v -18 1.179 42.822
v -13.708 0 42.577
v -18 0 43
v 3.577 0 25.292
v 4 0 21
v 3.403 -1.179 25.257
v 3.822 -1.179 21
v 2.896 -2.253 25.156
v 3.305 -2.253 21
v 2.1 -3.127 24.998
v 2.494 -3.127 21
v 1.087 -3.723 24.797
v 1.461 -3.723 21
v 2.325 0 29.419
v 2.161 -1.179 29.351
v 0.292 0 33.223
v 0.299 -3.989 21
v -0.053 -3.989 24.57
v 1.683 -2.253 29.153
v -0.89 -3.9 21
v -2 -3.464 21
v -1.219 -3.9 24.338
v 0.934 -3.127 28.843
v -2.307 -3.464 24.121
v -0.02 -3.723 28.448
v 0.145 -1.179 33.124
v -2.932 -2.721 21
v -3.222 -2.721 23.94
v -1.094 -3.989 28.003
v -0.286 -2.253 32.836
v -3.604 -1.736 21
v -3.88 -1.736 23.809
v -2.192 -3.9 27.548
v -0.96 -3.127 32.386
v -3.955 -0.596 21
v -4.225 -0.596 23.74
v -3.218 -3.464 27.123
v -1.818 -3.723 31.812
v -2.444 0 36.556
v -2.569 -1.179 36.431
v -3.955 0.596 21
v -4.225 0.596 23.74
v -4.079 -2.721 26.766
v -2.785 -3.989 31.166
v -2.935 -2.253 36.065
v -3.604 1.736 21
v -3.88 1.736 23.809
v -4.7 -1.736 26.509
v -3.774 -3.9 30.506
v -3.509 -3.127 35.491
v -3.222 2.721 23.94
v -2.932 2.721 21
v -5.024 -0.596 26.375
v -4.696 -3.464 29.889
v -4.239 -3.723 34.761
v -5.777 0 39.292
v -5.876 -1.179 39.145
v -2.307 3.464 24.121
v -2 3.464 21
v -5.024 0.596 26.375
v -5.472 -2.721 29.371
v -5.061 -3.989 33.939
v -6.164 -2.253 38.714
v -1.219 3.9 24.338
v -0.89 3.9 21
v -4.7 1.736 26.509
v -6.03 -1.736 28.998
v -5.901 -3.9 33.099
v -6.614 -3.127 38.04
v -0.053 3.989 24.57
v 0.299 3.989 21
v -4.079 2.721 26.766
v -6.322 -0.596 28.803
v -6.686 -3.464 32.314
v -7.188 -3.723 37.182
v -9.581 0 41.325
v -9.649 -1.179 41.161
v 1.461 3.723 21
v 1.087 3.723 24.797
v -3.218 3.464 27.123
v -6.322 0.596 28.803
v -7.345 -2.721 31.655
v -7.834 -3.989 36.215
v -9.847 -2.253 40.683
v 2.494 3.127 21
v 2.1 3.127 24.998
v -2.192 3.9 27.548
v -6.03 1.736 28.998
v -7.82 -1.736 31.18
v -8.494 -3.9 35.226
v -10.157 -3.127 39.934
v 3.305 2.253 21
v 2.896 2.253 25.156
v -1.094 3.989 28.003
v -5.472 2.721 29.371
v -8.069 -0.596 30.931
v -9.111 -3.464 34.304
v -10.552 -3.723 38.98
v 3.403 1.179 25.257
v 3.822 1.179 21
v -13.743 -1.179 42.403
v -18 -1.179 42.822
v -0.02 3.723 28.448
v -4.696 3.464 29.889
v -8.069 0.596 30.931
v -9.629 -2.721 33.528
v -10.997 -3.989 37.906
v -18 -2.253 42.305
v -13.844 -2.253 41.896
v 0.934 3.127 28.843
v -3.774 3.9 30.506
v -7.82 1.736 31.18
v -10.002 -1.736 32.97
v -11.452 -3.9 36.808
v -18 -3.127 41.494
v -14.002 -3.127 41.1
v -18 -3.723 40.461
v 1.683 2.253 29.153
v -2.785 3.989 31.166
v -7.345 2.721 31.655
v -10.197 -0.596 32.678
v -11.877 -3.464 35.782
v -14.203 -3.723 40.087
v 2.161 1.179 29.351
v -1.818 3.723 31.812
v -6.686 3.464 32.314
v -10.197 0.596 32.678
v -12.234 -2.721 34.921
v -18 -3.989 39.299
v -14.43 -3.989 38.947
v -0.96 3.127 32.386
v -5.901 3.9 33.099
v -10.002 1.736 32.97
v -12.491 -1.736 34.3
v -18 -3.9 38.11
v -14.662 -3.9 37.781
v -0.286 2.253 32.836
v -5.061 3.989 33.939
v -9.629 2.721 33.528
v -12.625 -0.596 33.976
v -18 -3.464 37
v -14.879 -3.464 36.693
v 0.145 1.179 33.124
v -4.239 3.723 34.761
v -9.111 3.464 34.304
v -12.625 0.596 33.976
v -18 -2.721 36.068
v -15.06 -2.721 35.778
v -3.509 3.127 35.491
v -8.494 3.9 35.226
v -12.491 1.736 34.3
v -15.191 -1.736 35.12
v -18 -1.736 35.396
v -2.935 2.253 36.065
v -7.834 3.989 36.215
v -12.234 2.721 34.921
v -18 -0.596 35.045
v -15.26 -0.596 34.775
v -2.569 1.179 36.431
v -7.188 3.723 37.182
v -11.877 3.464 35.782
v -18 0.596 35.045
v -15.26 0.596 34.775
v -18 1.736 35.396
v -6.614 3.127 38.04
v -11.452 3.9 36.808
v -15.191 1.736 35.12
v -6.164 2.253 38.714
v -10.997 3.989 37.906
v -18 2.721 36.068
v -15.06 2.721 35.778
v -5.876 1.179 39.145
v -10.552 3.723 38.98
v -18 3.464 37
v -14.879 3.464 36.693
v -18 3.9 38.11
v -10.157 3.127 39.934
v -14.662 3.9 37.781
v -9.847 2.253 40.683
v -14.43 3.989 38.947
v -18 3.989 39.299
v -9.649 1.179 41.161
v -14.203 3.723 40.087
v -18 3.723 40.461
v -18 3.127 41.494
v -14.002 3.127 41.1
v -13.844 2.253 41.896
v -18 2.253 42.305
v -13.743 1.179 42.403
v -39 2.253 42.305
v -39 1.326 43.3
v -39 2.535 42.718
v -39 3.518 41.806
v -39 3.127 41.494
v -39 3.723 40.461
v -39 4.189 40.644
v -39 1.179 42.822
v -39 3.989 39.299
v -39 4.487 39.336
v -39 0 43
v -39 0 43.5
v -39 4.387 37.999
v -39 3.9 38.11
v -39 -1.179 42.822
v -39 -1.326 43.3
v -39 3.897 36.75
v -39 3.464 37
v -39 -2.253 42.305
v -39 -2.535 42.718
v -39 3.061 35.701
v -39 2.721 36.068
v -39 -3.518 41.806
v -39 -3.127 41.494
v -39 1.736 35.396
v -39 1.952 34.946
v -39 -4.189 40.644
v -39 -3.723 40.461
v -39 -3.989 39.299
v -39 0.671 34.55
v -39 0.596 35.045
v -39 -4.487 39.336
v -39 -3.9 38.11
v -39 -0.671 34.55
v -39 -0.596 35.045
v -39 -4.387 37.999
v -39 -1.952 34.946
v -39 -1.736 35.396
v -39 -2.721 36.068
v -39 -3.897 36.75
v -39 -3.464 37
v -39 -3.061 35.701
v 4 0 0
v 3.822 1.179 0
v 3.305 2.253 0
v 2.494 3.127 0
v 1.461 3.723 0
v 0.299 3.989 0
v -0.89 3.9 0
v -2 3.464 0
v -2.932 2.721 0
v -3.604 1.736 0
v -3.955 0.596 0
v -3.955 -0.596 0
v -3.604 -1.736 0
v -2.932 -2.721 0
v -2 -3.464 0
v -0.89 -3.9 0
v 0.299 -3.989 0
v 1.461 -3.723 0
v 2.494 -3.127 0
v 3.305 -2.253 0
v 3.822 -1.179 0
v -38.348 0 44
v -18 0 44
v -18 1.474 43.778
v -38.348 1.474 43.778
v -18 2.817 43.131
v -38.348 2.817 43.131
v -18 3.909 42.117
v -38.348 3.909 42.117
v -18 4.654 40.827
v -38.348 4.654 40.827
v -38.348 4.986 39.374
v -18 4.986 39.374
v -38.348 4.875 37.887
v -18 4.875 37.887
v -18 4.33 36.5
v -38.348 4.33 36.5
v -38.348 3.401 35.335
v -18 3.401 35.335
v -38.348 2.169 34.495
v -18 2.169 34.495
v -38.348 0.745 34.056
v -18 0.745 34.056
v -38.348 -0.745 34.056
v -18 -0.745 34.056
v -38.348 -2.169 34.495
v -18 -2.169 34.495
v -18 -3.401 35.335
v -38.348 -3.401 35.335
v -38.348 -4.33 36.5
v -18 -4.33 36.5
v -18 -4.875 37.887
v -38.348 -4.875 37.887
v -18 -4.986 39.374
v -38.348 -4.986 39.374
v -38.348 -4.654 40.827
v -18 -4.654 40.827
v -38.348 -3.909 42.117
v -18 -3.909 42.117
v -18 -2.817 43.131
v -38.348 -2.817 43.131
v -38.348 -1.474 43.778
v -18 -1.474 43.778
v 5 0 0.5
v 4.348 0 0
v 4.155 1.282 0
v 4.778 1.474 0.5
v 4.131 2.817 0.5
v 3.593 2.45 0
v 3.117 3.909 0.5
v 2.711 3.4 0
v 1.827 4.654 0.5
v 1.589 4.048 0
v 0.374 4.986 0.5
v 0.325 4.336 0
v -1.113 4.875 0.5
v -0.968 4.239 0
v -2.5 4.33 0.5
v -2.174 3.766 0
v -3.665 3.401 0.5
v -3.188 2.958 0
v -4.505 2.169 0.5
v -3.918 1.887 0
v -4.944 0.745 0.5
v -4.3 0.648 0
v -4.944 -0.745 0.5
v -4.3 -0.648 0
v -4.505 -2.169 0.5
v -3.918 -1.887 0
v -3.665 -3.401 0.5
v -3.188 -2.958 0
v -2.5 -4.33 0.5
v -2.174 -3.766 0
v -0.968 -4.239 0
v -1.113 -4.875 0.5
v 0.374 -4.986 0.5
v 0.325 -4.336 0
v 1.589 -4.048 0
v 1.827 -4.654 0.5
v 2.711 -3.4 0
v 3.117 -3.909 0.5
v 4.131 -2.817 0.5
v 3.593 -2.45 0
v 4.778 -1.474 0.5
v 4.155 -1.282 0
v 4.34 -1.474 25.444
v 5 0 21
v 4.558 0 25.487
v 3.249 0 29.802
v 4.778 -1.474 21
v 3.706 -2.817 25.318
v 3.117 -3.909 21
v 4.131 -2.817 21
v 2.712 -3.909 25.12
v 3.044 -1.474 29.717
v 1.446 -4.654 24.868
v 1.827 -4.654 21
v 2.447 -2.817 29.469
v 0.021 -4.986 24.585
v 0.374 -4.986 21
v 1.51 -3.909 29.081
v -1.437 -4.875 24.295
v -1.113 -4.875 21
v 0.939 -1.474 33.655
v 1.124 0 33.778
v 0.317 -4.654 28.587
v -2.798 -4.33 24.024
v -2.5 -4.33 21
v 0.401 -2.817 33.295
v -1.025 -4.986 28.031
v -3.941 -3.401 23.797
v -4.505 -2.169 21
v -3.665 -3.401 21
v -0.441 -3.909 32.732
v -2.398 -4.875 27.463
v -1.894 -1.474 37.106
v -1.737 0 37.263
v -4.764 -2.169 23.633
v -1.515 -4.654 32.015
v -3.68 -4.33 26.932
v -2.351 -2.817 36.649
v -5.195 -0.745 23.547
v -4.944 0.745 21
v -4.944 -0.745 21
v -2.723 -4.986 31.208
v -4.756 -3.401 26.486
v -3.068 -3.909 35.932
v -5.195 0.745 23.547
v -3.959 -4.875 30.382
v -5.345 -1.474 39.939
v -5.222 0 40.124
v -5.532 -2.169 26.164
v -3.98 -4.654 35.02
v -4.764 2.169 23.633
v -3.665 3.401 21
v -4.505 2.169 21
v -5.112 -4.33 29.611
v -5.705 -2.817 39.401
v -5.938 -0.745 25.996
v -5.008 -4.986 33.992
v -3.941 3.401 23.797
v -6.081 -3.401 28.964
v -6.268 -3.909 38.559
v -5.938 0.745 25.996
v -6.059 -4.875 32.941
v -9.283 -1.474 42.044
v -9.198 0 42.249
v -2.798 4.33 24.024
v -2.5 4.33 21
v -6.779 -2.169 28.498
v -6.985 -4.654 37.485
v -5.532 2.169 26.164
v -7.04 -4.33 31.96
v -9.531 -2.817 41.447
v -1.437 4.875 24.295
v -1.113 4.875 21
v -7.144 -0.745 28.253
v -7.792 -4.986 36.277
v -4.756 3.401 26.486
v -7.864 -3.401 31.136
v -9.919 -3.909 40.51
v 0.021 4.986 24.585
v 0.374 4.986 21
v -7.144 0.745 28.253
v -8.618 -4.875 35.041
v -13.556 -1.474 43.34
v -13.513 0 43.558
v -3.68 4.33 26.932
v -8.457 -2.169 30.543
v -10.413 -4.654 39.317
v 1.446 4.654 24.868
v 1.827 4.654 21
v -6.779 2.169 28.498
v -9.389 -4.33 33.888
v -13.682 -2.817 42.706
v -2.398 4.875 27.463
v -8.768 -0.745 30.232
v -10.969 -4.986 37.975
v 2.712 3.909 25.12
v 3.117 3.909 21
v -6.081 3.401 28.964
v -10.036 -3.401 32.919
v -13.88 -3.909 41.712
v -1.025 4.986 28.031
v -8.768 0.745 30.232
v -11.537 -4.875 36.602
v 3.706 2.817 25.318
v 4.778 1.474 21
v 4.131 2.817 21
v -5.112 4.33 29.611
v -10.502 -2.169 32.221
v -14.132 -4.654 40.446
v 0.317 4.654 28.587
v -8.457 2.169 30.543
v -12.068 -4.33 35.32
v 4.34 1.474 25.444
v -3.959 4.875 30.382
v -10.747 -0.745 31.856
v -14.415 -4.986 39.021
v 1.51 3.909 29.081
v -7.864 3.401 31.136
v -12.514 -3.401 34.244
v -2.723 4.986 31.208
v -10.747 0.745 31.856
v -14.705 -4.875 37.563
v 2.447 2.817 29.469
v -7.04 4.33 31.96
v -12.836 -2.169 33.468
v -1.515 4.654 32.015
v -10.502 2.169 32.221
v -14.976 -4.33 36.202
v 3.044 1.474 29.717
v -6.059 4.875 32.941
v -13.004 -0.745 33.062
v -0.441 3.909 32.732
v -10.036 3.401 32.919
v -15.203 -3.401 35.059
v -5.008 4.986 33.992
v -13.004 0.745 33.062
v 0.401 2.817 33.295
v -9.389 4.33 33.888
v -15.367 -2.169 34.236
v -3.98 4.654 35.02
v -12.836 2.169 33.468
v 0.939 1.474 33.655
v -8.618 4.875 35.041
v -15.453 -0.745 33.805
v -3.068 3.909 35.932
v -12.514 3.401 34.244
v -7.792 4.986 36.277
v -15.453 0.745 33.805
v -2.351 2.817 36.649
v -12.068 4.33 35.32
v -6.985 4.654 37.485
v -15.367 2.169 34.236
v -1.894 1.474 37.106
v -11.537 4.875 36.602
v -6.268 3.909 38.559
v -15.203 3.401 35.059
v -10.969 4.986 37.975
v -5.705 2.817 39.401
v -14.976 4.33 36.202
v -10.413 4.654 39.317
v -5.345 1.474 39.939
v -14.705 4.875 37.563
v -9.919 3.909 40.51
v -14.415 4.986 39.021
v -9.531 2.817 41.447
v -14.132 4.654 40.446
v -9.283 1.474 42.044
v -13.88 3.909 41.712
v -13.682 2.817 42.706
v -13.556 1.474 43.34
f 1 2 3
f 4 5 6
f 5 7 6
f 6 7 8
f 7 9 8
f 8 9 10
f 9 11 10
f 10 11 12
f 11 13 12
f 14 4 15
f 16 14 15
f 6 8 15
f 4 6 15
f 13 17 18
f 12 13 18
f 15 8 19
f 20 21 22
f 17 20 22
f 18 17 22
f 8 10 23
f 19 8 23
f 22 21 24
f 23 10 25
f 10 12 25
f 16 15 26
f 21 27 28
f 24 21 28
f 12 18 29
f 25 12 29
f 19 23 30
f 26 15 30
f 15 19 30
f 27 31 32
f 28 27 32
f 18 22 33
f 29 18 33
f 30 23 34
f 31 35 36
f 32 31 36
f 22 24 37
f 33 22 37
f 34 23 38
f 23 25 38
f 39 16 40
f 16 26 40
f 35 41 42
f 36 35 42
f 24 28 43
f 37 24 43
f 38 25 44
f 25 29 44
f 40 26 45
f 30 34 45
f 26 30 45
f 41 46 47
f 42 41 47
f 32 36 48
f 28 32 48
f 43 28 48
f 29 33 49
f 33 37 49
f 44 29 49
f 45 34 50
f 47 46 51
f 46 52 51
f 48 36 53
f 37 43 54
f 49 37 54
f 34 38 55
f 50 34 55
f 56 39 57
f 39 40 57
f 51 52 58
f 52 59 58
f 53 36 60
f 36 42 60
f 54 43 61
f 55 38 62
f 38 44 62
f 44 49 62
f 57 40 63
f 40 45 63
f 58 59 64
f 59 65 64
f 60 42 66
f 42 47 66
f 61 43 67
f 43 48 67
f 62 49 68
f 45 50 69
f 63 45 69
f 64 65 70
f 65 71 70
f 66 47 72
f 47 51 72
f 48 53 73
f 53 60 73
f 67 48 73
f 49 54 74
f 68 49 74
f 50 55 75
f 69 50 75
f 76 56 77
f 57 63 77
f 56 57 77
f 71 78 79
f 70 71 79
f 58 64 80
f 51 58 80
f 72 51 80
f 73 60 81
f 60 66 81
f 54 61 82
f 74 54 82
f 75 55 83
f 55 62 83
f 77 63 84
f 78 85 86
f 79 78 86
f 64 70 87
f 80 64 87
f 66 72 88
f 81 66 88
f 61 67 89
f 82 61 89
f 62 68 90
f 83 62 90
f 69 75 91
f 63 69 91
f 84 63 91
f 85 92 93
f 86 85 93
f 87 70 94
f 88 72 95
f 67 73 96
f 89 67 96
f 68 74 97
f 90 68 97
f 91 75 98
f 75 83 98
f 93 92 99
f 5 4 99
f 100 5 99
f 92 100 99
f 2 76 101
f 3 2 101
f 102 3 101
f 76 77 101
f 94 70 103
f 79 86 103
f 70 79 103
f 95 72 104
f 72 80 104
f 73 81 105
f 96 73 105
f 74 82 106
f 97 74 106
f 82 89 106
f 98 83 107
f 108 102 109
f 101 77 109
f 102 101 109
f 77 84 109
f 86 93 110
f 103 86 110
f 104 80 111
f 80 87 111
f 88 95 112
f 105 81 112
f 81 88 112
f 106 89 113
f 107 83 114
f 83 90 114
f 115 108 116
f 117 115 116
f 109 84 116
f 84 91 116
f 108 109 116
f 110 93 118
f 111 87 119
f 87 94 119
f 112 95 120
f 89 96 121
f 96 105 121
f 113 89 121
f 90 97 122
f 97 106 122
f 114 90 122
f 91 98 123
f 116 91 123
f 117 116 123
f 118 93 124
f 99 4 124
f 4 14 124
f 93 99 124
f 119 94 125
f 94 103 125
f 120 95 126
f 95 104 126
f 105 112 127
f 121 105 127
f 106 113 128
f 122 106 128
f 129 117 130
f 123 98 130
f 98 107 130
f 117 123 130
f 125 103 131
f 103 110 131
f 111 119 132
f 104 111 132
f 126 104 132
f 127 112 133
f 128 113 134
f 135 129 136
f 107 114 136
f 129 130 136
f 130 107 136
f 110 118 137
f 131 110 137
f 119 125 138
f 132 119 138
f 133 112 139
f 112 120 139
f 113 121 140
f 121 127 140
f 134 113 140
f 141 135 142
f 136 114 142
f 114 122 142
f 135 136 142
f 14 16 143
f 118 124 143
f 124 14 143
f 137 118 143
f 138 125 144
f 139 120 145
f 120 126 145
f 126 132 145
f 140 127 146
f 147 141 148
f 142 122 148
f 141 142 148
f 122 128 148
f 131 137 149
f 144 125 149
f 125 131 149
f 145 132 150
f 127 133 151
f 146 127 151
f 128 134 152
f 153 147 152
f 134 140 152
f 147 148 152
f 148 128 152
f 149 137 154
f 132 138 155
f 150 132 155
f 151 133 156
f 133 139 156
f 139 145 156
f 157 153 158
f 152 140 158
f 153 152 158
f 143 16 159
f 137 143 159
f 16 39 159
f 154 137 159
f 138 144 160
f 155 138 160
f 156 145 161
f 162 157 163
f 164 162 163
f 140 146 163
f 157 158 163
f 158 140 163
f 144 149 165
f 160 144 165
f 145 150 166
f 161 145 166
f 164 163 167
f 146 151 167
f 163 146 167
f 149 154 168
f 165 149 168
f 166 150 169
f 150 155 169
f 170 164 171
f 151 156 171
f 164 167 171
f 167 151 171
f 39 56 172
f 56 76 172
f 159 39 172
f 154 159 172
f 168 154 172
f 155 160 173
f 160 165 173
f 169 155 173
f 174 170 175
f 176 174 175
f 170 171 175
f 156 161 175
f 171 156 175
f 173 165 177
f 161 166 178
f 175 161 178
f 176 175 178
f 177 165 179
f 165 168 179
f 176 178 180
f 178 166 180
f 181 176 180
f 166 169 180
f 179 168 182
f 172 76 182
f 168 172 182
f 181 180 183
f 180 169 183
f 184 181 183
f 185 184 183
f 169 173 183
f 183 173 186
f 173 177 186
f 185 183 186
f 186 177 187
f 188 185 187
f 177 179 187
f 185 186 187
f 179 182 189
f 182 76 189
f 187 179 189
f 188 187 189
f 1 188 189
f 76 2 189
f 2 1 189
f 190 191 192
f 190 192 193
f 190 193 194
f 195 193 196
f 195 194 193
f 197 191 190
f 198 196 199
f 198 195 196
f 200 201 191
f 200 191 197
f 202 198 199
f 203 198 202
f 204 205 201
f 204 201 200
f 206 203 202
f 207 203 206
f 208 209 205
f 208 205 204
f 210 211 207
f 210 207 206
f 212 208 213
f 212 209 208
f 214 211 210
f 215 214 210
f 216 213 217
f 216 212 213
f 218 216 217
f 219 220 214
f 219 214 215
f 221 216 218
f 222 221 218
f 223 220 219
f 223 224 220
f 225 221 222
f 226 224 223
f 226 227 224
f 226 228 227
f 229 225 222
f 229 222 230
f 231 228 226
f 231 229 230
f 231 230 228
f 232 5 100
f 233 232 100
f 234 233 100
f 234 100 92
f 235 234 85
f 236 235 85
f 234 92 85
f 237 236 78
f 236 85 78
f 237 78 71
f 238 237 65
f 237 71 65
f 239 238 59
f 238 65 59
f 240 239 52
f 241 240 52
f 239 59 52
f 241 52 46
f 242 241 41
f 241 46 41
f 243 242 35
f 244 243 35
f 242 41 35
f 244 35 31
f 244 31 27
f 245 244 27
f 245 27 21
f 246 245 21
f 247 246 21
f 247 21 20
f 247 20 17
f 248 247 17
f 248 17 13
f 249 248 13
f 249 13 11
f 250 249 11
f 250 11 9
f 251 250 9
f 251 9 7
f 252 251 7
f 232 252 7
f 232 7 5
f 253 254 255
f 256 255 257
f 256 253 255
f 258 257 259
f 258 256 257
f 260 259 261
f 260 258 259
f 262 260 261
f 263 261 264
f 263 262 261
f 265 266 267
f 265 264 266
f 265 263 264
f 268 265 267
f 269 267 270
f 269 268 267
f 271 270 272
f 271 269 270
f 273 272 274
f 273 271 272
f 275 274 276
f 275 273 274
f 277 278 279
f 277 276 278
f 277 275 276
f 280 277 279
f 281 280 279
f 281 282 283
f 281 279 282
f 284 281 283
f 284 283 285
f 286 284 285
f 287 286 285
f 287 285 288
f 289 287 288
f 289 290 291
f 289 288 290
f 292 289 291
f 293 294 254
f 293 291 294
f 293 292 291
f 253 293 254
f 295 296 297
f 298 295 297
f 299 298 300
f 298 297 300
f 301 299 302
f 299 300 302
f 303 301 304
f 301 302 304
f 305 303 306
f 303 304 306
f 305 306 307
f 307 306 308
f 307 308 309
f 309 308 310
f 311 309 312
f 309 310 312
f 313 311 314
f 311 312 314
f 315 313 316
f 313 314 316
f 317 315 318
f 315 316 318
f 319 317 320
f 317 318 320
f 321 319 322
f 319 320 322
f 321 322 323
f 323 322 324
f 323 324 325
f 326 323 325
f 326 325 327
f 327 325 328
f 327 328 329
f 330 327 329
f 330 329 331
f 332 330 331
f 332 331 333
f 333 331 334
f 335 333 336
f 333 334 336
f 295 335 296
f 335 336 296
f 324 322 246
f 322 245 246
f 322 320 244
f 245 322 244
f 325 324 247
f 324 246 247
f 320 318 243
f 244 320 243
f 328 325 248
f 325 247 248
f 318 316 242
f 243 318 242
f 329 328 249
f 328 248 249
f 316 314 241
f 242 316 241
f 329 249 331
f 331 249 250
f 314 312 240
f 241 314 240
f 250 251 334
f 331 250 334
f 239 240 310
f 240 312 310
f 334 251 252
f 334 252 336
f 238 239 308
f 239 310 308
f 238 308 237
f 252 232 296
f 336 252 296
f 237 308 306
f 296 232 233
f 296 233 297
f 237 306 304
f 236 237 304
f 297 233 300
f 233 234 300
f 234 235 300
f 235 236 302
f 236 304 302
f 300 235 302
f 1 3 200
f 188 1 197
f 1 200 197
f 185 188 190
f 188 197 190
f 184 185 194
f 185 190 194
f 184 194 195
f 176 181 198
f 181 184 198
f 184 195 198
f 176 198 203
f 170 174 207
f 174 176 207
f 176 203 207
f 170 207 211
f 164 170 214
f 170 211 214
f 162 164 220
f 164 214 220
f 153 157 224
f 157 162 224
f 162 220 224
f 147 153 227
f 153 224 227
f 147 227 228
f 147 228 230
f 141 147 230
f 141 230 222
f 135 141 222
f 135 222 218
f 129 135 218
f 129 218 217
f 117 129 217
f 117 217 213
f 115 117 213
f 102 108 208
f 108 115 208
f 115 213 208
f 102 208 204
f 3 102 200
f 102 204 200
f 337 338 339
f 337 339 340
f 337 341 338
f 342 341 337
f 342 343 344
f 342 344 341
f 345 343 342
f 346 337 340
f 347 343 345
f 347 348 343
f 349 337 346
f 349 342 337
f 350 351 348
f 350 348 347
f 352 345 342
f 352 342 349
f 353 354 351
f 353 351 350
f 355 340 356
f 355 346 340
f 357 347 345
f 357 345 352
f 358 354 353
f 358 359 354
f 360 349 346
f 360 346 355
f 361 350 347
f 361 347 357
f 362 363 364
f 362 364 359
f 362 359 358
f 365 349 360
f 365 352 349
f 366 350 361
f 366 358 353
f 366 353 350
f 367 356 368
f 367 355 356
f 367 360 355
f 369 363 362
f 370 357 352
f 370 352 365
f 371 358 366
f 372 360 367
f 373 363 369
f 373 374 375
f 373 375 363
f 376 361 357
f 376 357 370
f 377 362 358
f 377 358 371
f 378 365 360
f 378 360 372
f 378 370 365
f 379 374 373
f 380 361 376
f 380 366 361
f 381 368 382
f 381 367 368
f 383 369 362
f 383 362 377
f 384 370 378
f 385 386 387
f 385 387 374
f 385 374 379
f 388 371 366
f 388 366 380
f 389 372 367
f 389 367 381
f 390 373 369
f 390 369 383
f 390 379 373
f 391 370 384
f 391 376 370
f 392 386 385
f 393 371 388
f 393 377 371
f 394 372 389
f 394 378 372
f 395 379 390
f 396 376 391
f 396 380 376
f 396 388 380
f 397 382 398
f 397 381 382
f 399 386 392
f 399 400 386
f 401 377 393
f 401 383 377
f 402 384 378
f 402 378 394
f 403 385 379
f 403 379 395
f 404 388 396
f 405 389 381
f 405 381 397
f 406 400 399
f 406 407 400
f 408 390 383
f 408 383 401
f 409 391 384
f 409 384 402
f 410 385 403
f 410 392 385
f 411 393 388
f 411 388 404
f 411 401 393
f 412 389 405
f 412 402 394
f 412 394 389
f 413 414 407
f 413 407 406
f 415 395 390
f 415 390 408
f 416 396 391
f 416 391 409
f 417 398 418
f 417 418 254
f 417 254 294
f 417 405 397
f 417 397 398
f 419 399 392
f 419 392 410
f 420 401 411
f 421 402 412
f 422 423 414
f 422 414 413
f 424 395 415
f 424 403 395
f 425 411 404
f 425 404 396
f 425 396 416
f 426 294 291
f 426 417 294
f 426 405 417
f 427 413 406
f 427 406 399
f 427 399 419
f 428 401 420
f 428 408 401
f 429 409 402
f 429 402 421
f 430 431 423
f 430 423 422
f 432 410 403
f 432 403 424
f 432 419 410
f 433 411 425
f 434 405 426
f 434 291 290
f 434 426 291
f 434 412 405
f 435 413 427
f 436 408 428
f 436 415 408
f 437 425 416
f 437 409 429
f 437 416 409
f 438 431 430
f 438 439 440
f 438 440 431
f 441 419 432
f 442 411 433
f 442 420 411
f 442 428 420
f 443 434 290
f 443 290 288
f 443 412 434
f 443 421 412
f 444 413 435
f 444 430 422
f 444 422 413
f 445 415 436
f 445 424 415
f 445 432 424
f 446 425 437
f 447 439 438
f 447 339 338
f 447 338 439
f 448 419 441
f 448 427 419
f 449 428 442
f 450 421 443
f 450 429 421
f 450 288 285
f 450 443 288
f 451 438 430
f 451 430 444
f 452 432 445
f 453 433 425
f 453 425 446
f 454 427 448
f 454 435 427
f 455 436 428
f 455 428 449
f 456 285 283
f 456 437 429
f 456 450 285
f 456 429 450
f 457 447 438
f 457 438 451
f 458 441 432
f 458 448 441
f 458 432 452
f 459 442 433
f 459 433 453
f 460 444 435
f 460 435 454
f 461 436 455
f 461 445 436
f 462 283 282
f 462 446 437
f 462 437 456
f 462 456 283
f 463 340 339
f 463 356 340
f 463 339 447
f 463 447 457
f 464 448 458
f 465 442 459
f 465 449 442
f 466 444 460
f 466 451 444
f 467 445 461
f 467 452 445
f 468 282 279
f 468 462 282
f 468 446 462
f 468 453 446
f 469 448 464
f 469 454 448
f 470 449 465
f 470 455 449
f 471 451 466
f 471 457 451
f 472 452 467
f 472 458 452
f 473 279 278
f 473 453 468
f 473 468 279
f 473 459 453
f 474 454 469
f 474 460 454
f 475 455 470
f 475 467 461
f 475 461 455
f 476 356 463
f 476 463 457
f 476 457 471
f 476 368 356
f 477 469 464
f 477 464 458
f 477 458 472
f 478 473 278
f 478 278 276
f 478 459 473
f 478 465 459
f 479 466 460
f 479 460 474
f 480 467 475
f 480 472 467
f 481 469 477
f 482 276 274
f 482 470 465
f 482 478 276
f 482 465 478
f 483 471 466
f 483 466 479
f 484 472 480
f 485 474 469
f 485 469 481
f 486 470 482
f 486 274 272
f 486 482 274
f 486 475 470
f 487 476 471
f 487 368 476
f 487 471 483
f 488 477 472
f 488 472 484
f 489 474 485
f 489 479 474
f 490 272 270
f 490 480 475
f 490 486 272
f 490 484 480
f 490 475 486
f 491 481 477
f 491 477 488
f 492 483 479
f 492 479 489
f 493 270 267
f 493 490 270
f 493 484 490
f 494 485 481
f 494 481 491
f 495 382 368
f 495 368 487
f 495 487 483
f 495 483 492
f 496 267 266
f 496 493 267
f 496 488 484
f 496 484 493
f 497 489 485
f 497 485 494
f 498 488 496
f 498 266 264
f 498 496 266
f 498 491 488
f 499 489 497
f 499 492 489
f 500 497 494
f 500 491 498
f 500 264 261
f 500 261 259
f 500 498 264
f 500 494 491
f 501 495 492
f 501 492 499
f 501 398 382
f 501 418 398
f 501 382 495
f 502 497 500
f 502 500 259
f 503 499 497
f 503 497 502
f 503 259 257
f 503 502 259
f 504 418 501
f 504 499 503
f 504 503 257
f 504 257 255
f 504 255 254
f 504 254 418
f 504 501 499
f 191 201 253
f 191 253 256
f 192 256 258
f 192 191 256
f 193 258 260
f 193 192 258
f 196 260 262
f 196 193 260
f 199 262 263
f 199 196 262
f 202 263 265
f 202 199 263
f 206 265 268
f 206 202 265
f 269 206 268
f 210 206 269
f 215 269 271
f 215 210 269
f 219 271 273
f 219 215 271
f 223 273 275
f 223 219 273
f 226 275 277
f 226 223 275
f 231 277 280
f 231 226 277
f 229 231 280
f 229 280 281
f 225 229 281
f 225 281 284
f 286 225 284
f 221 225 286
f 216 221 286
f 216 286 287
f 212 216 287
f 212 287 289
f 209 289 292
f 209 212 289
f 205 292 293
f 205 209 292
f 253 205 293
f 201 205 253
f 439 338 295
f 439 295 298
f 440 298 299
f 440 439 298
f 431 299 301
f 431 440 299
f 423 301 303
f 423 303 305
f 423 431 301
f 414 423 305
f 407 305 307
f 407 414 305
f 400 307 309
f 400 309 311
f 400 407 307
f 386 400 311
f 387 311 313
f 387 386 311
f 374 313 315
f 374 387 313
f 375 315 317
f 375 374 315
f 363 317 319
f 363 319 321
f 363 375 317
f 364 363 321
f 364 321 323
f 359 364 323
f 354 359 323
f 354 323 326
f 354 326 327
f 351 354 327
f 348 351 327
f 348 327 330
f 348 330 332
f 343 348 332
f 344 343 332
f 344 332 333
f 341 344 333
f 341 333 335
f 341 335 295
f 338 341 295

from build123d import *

# Parameters (mm, degrees)
F0_R        = 5
F0_R_2      = 4
F3_C1_SIZE2 = 0.6516126864
F3_C1_SIZE  = 0.5
F3_C2_SIZE2 = 0.5
F3_C2_SIZE  = 0.6516126864


with BuildPart() as f2:
    # F2: sweep along a path in F1
    with BuildLine(Plane.XZ) as f2_path:
        Line((0, 0), (0, 21))
        ThreePointArc((0, 21), (-5.2720779386, 33.7279220614), (-18, 39))
        Line((-18, 39), (-39, 39))
    # F0 (on Top) → F2 (sweep)
    with BuildSketch(Plane.XY):
        Circle(F0_R)
        Circle(F0_R_2, mode=Mode.SUBTRACT)
    sweep(path=f2_path.line)

    # F3: chamfer of 0.5 x 0.6516126864 on 2 edges, made by hand

    # F3_c1
    f3_c1_edges = [f2.edges().sort_by_distance(p)[0] for p in [
        (-5, 0, 0),
    ]]
    f3_c1_side = f2.faces().sort_by_distance((-5, 0, 0.01))[0]
    chamfer(f3_c1_edges, length=F3_C1_SIZE, length2=F3_C1_SIZE2, reference=f3_c1_side)

    # F3_c2
    f3_c2_edges = [f2.edges().sort_by_distance(p)[0] for p in [
        (-39, 0, 34),
    ]]
    f3_c2_side = f2.faces().sort_by_distance((-38.99, 0, 34))[0]
    chamfer(f3_c2_edges, length=F3_C2_SIZE, length2=F3_C2_SIZE2, reference=f3_c2_side)


solid = f2.part
